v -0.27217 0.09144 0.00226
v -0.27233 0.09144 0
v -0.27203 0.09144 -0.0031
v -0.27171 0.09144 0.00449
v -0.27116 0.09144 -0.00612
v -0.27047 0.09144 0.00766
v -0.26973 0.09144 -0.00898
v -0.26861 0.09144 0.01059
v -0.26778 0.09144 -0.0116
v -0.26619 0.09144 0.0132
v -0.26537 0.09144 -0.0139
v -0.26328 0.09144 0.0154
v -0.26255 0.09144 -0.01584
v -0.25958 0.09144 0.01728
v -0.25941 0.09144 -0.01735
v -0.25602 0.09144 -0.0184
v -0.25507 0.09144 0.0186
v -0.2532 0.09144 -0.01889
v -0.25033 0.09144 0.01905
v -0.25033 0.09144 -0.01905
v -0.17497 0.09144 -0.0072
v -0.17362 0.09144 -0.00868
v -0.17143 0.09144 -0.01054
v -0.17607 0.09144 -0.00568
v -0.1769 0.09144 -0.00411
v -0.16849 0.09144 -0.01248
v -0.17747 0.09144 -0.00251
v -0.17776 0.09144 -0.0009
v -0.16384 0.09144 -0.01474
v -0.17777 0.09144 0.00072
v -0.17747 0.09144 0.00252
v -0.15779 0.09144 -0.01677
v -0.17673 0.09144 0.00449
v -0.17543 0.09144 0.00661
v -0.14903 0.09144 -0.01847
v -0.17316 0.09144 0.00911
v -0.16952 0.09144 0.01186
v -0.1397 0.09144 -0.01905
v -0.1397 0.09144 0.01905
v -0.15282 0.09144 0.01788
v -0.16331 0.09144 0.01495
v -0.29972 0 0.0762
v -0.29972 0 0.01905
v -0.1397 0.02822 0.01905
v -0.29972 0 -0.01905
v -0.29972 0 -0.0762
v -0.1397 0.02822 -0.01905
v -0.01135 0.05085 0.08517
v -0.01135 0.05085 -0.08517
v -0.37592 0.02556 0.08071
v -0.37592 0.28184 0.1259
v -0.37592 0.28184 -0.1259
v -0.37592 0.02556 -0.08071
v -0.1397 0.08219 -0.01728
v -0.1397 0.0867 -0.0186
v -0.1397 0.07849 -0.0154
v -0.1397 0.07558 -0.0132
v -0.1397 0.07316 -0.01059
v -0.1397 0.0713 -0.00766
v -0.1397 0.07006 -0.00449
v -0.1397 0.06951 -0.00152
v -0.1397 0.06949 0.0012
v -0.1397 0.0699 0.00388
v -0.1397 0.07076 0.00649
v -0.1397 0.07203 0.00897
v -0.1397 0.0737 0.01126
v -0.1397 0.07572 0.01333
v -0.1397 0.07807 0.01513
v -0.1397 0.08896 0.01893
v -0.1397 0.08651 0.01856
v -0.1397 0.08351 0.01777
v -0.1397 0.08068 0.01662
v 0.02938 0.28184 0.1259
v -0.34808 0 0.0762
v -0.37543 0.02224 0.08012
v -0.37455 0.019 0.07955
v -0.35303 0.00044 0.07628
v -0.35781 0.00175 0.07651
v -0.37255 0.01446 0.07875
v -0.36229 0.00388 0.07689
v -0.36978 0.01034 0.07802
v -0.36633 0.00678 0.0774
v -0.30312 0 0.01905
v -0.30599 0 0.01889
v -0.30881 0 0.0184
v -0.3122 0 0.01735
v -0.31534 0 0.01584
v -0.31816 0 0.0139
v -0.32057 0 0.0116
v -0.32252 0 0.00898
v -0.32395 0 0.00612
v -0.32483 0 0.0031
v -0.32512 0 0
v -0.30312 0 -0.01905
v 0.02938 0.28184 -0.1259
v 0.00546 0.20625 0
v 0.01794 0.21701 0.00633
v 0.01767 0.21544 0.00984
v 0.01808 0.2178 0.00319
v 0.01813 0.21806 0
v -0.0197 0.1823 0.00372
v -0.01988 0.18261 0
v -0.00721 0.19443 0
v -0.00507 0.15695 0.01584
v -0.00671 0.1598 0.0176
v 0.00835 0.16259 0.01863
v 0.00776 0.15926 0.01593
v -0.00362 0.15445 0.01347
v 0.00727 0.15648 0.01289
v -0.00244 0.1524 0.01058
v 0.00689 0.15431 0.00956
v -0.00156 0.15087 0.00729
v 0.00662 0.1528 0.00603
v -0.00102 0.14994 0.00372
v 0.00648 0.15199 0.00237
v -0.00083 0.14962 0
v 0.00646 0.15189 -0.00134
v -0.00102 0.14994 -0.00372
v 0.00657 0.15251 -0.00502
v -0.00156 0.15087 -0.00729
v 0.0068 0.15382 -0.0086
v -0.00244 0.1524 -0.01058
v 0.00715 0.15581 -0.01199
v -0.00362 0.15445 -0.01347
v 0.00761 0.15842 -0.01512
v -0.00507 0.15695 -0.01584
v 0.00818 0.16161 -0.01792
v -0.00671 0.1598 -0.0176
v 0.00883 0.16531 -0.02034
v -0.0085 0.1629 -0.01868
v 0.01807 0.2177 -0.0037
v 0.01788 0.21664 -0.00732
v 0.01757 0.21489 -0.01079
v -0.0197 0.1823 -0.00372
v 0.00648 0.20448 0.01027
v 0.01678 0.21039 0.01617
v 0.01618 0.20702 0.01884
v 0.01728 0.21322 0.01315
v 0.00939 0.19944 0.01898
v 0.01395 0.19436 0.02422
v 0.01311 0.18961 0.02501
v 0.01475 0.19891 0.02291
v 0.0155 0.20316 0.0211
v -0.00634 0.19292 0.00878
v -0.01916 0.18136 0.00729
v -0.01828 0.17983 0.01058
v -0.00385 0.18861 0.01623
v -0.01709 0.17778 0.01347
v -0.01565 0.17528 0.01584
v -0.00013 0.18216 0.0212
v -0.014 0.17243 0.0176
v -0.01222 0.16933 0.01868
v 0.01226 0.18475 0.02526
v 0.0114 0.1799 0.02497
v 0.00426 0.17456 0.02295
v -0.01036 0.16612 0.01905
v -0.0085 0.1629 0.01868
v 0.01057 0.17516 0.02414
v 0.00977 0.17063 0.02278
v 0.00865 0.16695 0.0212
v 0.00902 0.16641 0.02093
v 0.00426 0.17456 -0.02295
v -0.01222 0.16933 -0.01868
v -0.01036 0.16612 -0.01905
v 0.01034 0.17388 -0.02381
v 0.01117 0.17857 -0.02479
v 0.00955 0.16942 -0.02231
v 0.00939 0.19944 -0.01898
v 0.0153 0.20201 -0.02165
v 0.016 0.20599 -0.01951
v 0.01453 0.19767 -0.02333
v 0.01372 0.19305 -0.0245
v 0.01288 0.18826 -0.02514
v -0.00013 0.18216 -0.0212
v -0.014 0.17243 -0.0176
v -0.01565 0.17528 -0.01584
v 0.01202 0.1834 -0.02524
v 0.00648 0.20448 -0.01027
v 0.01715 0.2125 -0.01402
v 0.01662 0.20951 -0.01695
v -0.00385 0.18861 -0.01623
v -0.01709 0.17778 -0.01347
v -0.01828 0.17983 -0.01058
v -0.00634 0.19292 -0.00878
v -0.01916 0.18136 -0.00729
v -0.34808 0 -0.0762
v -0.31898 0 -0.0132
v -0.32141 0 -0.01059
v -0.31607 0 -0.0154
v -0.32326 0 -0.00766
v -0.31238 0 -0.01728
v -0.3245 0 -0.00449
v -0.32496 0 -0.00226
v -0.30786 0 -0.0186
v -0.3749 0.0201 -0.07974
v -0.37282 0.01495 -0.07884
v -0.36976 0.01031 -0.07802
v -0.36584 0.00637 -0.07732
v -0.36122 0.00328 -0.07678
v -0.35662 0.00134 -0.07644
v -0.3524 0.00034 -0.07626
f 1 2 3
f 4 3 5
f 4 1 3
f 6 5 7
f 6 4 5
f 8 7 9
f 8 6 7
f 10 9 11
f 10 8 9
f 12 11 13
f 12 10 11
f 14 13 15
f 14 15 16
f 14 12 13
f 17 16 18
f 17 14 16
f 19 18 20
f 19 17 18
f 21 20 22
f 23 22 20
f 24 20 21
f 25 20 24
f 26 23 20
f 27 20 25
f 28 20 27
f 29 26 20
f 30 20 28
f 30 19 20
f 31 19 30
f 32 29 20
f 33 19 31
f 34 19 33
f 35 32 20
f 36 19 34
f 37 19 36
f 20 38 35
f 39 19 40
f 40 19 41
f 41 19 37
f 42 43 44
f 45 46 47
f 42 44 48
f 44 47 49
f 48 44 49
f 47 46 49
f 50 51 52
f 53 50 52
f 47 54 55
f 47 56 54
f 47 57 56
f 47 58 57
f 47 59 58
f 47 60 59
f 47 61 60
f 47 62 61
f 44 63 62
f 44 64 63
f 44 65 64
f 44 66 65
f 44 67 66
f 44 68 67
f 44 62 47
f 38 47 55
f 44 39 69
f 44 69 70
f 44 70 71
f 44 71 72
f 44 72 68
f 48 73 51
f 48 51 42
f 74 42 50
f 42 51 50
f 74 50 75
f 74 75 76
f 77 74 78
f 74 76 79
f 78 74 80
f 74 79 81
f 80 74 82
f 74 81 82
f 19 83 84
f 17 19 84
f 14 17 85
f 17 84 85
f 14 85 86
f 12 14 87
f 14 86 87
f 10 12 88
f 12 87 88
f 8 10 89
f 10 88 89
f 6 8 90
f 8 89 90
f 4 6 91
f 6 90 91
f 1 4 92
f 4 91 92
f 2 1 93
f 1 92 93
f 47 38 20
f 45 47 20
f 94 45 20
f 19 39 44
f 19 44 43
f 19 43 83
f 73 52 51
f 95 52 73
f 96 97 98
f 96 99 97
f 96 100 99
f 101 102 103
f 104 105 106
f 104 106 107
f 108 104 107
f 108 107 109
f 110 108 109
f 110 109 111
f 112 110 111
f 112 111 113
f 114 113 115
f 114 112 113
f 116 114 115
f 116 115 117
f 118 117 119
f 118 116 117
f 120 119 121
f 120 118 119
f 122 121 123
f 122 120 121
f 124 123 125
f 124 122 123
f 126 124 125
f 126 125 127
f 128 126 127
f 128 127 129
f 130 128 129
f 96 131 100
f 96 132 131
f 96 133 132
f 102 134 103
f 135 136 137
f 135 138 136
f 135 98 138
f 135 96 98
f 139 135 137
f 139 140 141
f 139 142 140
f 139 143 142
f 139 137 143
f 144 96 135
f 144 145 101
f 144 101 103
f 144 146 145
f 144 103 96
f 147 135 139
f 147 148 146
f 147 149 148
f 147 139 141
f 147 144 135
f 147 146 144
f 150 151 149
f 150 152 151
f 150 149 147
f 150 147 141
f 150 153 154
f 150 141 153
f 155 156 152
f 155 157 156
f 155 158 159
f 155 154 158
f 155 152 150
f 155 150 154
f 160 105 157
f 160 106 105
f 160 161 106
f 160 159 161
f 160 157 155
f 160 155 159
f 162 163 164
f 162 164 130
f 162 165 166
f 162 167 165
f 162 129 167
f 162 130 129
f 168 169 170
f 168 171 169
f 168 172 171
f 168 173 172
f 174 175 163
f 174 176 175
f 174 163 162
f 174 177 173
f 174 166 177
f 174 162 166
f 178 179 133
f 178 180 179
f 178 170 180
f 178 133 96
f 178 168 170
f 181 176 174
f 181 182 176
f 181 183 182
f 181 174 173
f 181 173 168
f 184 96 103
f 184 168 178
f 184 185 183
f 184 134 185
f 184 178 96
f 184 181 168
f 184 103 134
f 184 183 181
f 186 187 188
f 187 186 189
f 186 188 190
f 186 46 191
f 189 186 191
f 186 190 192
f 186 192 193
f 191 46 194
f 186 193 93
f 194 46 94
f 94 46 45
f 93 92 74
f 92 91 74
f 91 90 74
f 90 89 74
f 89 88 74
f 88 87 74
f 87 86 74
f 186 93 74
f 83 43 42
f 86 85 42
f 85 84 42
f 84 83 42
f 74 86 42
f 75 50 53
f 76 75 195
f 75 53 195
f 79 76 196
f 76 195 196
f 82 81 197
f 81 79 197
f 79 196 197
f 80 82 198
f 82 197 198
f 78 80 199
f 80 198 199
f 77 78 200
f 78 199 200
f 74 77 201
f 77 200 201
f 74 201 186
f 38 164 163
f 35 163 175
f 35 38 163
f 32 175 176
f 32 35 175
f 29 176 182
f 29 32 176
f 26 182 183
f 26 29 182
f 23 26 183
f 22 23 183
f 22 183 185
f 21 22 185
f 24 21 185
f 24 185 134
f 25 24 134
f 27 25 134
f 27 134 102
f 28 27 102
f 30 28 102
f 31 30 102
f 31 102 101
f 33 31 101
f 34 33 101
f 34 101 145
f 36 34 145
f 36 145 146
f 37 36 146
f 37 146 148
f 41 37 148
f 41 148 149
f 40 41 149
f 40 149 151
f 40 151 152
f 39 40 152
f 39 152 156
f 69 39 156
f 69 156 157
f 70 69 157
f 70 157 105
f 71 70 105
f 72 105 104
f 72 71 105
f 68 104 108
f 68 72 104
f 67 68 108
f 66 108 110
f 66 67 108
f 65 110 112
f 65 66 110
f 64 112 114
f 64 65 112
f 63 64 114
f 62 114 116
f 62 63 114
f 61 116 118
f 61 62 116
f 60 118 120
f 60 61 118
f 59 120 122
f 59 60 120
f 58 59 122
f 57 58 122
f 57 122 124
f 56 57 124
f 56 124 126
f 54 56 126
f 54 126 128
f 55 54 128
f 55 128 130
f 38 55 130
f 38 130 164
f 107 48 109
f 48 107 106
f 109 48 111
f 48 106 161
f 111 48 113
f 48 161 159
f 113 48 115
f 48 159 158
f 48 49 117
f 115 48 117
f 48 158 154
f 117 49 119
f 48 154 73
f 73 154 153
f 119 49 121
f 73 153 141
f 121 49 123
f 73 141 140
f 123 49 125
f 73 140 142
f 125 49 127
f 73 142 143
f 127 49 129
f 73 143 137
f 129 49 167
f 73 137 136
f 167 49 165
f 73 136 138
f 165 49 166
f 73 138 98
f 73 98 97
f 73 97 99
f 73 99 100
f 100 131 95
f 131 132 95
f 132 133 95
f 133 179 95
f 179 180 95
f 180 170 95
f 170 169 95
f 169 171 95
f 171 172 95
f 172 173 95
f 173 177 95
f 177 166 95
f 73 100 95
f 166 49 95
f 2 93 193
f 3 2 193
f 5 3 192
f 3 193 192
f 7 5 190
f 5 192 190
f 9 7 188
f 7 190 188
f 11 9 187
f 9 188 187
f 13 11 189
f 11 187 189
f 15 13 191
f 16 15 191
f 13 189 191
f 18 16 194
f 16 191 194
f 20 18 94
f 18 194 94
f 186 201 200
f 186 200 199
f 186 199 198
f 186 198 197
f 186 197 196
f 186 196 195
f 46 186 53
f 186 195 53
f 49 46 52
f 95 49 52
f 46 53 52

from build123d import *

# Parameters (mm, degrees)
TD_SKETCH_R                             = 0.79248
TL_FEATURE_DEPTH                        = 21.0312
TDF_STD_SKETCH_W                        = 1.60495996
TDF_STD_SKETCH_H                        = 1.60495996
TDF_STD_FEATURE_DEPTH                   = 22.061040395
ISA_20_STD_FEATURE_DEPTH                = 22.061040395
ISA_20_STD_FEATURE_DEPTH_BACK           = 22.061040395
F_10BA_STD_FEATURE_DEPTH                = 22.061040395
F_10BA_STD_FEATURE_DEPTH_BACK           = 22.061040395
ERW_STD_FEATURE_DEPTH                   = 0.01905
H_STD_FEATURE_START                     = -0.299236296
H_STD_FEATURE_OUTLINE_R                 = 0.01905
H_STD_FEATURE_DEPTH                     = 0.299236296
H_STD_FEATURE_START_2                   = -0.291139417
H_STD_FEATURE_2_OUTLINE_R               = 0.01905
H_STD_FEATURE_2_DEPTH                   = 0.065991236
H_STD_FEATURE_START_3                   = -1
H_STD_FEATURE_3_OUTLINE_W               = 3
H_STD_FEATURE_3_OUTLINE_H               = 4
H_STD_FEATURE_3_DEPTH                   = 1
H_STD_CUT_FEATURE_DEPTH                 = 22.061040395
H_STD_CUT_FEATURE_DEPTH_BACK            = 22.061040395
H_STD_SKETCH_3_R                        = 0.01905
FUNNEL_FINAL_DIAMETRE_STD_FEATURE_DEPTH = 2.499995
FUNNEL_FINAL_DIAMETRE_STD_FEATURE_DRAFT = -13
ROUND_BR_STD_FEATURE_START              = -1
ROUND_BR_STD_FEATURE_DEPTH              = 1.009339363
FRO_STD_FEATURE_DEPTH                   = 22.061040395
FRO_STD_FEATURE_DEPTH_BACK              = 22.061040395


with BuildPart() as part:
    # TD_sketch → TL_feature (new body)
    with BuildSketch(Plane(origin=(0, 0, 0), x_dir=(1, 0, 0), z_dir=(0, 1, 0))):
        with Locations(Location((0, 0, 0), (0, 0, 270))):
            Circle(TD_SKETCH_R)
    extrude(amount=TL_FEATURE_DEPTH)

    # TDF_STD_sketch → TDF_STD_feature (cut, through all)
    with BuildSketch(Plane(origin=(0, 0, 0), x_dir=(1, 0, 0), z_dir=(0, 1, 0))):
        with Locations((-1.17839998, 0)):
            Rectangle(TDF_STD_SKETCH_W, TDF_STD_SKETCH_H)
    extrude(amount=TDF_STD_FEATURE_DEPTH, mode=Mode.SUBTRACT)

    # ISA_20_STD_sketch → ISA_20_STD_feature (cut, two sides: drawn at the far end of the back side and taken through both)
    with BuildSketch(Plane(origin=(0, 0, 0), x_dir=(0, 0, -1), z_dir=(1, 0, 0)).offset(-ISA_20_STD_FEATURE_DEPTH_BACK)):
        Polygon((-12.996080373, 73.27228267), (-3.784567997, 21.0312), (-0.0762, 0), (0.0762, 0), (3.784567997, 21.0312), (12.996080373, 73.27228267), (12.996080373, -32.821688483), (-12.996080373, -32.821688483), align=None)
    extrude(amount=ISA_20_STD_FEATURE_DEPTH + ISA_20_STD_FEATURE_DEPTH_BACK, mode=Mode.SUBTRACT)

    # 10BA_STD_sketch → 10BA_STD_feature (cut, two sides: drawn at the far end of the back side and taken through both)
    with BuildSketch(Plane.XY.offset(-F_10BA_STD_FEATURE_DEPTH_BACK)):
        Polygon((-53.216424634, 0), (-0.37592, 0), (-0.29972, 0), (-0.011354365, 0.050846642), (3.688047997, 21.0312), (12.863705333, 73.068938636), (91.245889802, 2.18375769), (25.165759835, -70.885180946), align=None)
    extrude(amount=F_10BA_STD_FEATURE_DEPTH + F_10BA_STD_FEATURE_DEPTH_BACK, mode=Mode.SUBTRACT)


with BuildPart() as body_2:
    # ERW_STD_sketch → ERW_STD_feature (new, symmetric)
    with BuildSketch(Plane.XY):
        Polygon((-0.1397, 0.09144), (-0.1397, 0), (-0.32512, 0), (-0.272327091, 0.09144), align=None)
    extrude(amount=ERW_STD_FEATURE_DEPTH, both=True)


with BuildPart() as body_3:
    # H_STD_feature: read off the stored shape, not the designer's step
    # H_STD_feature outline → H_STD_feature (new body)
    with BuildSketch(Plane(origin=(-0.010357492, 0.166115932, 0), x_dir=(0, 0, -1), z_dir=(0.8660254037844415, 0.4999999999999953, 0)).offset(H_STD_FEATURE_START)):
        Circle(H_STD_FEATURE_OUTLINE_R)
    extrude(amount=H_STD_FEATURE_DEPTH)

    # H_STD_feature 2 outline → H_STD_feature 2 (add)
    with BuildSketch(Plane(origin=(0, 0, 0), x_dir=(0.4999999999999952, -0.8660254037844414, 0), z_dir=(0.8660254037844414, 0.4999999999999952, 0)).offset(H_STD_FEATURE_START_2)):
        with Locations((-0.149039363, 0)):
            Circle(H_STD_FEATURE_2_OUTLINE_R)
    extrude(amount=H_STD_FEATURE_2_DEPTH)

    # H_STD_feature 3 outline → H_STD_feature 3 (cut)
    with BuildSketch(Plane(origin=(0, 0, 0), x_dir=(1, 0, 0), z_dir=(0, 1, 0)).offset(H_STD_FEATURE_START_3)):
        with Locations((-0.5, 0)):
            Rectangle(H_STD_FEATURE_3_OUTLINE_W, H_STD_FEATURE_3_OUTLINE_H)
    extrude(amount=H_STD_FEATURE_3_DEPTH, mode=Mode.SUBTRACT)

    # H_STD_cut_sketch → H_STD_cut_feature (cut, two sides: drawn at the far end of the back side and taken through both)
    with BuildSketch(Plane.XY.offset(-H_STD_CUT_FEATURE_DEPTH_BACK)):
        Polygon((-52.376024458, 0.09144), (-0.272327091, 0.09144), (-0.1397, 0.09144), (-0.1397, 0), (-0.1397, -52.103697367), (-73.796388553, -125.818508284), (-126.032713012, -73.623370917), align=None)
    extrude(amount=H_STD_CUT_FEATURE_DEPTH + H_STD_CUT_FEATURE_DEPTH_BACK, mode=Mode.SUBTRACT)


with BuildPart() as body_2_1:
    add(body_2.part)

    # H_STD_fix_feature: union body 3
    add(body_3.part)


with BuildPart() as funnel_final_diametre_std_feature_tool:
    # H_STD_sketch<3> → funnel_final_diametre_STD_feature (with draft: the straight prism first)
    with BuildSketch(Plane(origin=(-0.010357492, 0.166115932, 0), x_dir=(0, 0, -1), z_dir=(0.8660254037844415, 0.4999999999999953, 0))):
        with Locations(Location((0, 0, 0), (0, 0, 90))):
            Circle(H_STD_SKETCH_3_R)
    extrude(amount=FUNNEL_FINAL_DIAMETRE_STD_FEATURE_DEPTH)
    # funnel_final_diametre_STD_feature: the draft: its side faces are tilted about the plane it starts from
    funnel_final_diametre_std_feature_sides = [funnel_final_diametre_std_feature_tool.faces().sort_by_distance(p)[0] for p in [
        (1.081697098, 0.774616898, 0),
    ]]
    draft(funnel_final_diametre_std_feature_sides, Plane(origin=(-0.010357492, 0.166115932, 0), x_dir=(0, 0, -1), z_dir=(0.8660254037844415, 0.4999999999999953, 0)), FUNNEL_FINAL_DIAMETRE_STD_FEATURE_DRAFT)


with BuildPart() as body_2_2:
    add(body_2_1.part)

    # funnel_final_diametre_STD_feature: add funnel_final_diametre_std_feature_tool
    add(funnel_final_diametre_std_feature_tool.part)

    # ROUND_BR_STD_feature: read off the stored shape, not the designer's step
    # ROUND_BR_STD_feature outline → ROUND_BR_STD_feature (cut)
    with BuildSketch(Plane(origin=(0, 0, 0), x_dir=(0.8660254037844362, -0.5000000000000042, 0), z_dir=(0.5000000000000042, 0.8660254037844363, 0)).offset(ROUND_BR_STD_FEATURE_START)):
        with BuildLine():
            Line((-0.281562179, -0.01905), (-0.262512179, -0.01905))
            ThreePointArc((-0.262512179, -0.01905), (-0.275982563, -0.013470384), (-0.281562179, 0))
            Line((-0.281562179, 0), (-0.281562179, -0.01905))
        make_face()
        with BuildLine():
            Line((-0.281562179, 0.01905), (-0.281562179, 0))
            ThreePointArc((-0.281562179, 0), (-0.275982563, 0.013470384), (-0.262512179, 0.01905))
            Line((-0.262512179, 0.01905), (-0.281562179, 0.01905))
        make_face()
    extrude(amount=ROUND_BR_STD_FEATURE_DEPTH, mode=Mode.SUBTRACT)


with BuildPart() as part_1:
    add(part.part)

    # COMBINE_STD_feature: cut body 2
    add(body_2_2.part, mode=Mode.SUBTRACT)

    # FRO_STD_sketch → FRO_STD_feature (cut, two sides: drawn at the far end of the back side and taken through both)
    with BuildSketch(Plane.XY.offset(-FRO_STD_FEATURE_DEPTH_BACK)):
        with BuildLine():
            Line((-0.3760216, 52.152149391), (-0.3760216, 0.02794))
            ThreePointArc((-0.3760216, 0.02794), (-0.367838163, 0.008183437), (-0.3480816, 0))
            Line((-0.3480816, 0), (51.776127791, 0))
            Line((51.776127791, 0), (-21.938636058, -73.714763849))
            Line((-21.938636058, -73.714763849), (-74.090785449, -21.562614458))
            Line((-74.090785449, -21.562614458), (-0.3760216, 52.152149391))
        make_face()
    extrude(amount=FRO_STD_FEATURE_DEPTH + FRO_STD_FEATURE_DEPTH_BACK, mode=Mode.SUBTRACT)

    # cut_feature
    split(bisect_by=Plane(origin=(0, 0.281844732, 0), x_dir=(1, 0, 0), z_dir=(0, 1, 0)), keep=Keep.BOTTOM)


solid = part_1.part
